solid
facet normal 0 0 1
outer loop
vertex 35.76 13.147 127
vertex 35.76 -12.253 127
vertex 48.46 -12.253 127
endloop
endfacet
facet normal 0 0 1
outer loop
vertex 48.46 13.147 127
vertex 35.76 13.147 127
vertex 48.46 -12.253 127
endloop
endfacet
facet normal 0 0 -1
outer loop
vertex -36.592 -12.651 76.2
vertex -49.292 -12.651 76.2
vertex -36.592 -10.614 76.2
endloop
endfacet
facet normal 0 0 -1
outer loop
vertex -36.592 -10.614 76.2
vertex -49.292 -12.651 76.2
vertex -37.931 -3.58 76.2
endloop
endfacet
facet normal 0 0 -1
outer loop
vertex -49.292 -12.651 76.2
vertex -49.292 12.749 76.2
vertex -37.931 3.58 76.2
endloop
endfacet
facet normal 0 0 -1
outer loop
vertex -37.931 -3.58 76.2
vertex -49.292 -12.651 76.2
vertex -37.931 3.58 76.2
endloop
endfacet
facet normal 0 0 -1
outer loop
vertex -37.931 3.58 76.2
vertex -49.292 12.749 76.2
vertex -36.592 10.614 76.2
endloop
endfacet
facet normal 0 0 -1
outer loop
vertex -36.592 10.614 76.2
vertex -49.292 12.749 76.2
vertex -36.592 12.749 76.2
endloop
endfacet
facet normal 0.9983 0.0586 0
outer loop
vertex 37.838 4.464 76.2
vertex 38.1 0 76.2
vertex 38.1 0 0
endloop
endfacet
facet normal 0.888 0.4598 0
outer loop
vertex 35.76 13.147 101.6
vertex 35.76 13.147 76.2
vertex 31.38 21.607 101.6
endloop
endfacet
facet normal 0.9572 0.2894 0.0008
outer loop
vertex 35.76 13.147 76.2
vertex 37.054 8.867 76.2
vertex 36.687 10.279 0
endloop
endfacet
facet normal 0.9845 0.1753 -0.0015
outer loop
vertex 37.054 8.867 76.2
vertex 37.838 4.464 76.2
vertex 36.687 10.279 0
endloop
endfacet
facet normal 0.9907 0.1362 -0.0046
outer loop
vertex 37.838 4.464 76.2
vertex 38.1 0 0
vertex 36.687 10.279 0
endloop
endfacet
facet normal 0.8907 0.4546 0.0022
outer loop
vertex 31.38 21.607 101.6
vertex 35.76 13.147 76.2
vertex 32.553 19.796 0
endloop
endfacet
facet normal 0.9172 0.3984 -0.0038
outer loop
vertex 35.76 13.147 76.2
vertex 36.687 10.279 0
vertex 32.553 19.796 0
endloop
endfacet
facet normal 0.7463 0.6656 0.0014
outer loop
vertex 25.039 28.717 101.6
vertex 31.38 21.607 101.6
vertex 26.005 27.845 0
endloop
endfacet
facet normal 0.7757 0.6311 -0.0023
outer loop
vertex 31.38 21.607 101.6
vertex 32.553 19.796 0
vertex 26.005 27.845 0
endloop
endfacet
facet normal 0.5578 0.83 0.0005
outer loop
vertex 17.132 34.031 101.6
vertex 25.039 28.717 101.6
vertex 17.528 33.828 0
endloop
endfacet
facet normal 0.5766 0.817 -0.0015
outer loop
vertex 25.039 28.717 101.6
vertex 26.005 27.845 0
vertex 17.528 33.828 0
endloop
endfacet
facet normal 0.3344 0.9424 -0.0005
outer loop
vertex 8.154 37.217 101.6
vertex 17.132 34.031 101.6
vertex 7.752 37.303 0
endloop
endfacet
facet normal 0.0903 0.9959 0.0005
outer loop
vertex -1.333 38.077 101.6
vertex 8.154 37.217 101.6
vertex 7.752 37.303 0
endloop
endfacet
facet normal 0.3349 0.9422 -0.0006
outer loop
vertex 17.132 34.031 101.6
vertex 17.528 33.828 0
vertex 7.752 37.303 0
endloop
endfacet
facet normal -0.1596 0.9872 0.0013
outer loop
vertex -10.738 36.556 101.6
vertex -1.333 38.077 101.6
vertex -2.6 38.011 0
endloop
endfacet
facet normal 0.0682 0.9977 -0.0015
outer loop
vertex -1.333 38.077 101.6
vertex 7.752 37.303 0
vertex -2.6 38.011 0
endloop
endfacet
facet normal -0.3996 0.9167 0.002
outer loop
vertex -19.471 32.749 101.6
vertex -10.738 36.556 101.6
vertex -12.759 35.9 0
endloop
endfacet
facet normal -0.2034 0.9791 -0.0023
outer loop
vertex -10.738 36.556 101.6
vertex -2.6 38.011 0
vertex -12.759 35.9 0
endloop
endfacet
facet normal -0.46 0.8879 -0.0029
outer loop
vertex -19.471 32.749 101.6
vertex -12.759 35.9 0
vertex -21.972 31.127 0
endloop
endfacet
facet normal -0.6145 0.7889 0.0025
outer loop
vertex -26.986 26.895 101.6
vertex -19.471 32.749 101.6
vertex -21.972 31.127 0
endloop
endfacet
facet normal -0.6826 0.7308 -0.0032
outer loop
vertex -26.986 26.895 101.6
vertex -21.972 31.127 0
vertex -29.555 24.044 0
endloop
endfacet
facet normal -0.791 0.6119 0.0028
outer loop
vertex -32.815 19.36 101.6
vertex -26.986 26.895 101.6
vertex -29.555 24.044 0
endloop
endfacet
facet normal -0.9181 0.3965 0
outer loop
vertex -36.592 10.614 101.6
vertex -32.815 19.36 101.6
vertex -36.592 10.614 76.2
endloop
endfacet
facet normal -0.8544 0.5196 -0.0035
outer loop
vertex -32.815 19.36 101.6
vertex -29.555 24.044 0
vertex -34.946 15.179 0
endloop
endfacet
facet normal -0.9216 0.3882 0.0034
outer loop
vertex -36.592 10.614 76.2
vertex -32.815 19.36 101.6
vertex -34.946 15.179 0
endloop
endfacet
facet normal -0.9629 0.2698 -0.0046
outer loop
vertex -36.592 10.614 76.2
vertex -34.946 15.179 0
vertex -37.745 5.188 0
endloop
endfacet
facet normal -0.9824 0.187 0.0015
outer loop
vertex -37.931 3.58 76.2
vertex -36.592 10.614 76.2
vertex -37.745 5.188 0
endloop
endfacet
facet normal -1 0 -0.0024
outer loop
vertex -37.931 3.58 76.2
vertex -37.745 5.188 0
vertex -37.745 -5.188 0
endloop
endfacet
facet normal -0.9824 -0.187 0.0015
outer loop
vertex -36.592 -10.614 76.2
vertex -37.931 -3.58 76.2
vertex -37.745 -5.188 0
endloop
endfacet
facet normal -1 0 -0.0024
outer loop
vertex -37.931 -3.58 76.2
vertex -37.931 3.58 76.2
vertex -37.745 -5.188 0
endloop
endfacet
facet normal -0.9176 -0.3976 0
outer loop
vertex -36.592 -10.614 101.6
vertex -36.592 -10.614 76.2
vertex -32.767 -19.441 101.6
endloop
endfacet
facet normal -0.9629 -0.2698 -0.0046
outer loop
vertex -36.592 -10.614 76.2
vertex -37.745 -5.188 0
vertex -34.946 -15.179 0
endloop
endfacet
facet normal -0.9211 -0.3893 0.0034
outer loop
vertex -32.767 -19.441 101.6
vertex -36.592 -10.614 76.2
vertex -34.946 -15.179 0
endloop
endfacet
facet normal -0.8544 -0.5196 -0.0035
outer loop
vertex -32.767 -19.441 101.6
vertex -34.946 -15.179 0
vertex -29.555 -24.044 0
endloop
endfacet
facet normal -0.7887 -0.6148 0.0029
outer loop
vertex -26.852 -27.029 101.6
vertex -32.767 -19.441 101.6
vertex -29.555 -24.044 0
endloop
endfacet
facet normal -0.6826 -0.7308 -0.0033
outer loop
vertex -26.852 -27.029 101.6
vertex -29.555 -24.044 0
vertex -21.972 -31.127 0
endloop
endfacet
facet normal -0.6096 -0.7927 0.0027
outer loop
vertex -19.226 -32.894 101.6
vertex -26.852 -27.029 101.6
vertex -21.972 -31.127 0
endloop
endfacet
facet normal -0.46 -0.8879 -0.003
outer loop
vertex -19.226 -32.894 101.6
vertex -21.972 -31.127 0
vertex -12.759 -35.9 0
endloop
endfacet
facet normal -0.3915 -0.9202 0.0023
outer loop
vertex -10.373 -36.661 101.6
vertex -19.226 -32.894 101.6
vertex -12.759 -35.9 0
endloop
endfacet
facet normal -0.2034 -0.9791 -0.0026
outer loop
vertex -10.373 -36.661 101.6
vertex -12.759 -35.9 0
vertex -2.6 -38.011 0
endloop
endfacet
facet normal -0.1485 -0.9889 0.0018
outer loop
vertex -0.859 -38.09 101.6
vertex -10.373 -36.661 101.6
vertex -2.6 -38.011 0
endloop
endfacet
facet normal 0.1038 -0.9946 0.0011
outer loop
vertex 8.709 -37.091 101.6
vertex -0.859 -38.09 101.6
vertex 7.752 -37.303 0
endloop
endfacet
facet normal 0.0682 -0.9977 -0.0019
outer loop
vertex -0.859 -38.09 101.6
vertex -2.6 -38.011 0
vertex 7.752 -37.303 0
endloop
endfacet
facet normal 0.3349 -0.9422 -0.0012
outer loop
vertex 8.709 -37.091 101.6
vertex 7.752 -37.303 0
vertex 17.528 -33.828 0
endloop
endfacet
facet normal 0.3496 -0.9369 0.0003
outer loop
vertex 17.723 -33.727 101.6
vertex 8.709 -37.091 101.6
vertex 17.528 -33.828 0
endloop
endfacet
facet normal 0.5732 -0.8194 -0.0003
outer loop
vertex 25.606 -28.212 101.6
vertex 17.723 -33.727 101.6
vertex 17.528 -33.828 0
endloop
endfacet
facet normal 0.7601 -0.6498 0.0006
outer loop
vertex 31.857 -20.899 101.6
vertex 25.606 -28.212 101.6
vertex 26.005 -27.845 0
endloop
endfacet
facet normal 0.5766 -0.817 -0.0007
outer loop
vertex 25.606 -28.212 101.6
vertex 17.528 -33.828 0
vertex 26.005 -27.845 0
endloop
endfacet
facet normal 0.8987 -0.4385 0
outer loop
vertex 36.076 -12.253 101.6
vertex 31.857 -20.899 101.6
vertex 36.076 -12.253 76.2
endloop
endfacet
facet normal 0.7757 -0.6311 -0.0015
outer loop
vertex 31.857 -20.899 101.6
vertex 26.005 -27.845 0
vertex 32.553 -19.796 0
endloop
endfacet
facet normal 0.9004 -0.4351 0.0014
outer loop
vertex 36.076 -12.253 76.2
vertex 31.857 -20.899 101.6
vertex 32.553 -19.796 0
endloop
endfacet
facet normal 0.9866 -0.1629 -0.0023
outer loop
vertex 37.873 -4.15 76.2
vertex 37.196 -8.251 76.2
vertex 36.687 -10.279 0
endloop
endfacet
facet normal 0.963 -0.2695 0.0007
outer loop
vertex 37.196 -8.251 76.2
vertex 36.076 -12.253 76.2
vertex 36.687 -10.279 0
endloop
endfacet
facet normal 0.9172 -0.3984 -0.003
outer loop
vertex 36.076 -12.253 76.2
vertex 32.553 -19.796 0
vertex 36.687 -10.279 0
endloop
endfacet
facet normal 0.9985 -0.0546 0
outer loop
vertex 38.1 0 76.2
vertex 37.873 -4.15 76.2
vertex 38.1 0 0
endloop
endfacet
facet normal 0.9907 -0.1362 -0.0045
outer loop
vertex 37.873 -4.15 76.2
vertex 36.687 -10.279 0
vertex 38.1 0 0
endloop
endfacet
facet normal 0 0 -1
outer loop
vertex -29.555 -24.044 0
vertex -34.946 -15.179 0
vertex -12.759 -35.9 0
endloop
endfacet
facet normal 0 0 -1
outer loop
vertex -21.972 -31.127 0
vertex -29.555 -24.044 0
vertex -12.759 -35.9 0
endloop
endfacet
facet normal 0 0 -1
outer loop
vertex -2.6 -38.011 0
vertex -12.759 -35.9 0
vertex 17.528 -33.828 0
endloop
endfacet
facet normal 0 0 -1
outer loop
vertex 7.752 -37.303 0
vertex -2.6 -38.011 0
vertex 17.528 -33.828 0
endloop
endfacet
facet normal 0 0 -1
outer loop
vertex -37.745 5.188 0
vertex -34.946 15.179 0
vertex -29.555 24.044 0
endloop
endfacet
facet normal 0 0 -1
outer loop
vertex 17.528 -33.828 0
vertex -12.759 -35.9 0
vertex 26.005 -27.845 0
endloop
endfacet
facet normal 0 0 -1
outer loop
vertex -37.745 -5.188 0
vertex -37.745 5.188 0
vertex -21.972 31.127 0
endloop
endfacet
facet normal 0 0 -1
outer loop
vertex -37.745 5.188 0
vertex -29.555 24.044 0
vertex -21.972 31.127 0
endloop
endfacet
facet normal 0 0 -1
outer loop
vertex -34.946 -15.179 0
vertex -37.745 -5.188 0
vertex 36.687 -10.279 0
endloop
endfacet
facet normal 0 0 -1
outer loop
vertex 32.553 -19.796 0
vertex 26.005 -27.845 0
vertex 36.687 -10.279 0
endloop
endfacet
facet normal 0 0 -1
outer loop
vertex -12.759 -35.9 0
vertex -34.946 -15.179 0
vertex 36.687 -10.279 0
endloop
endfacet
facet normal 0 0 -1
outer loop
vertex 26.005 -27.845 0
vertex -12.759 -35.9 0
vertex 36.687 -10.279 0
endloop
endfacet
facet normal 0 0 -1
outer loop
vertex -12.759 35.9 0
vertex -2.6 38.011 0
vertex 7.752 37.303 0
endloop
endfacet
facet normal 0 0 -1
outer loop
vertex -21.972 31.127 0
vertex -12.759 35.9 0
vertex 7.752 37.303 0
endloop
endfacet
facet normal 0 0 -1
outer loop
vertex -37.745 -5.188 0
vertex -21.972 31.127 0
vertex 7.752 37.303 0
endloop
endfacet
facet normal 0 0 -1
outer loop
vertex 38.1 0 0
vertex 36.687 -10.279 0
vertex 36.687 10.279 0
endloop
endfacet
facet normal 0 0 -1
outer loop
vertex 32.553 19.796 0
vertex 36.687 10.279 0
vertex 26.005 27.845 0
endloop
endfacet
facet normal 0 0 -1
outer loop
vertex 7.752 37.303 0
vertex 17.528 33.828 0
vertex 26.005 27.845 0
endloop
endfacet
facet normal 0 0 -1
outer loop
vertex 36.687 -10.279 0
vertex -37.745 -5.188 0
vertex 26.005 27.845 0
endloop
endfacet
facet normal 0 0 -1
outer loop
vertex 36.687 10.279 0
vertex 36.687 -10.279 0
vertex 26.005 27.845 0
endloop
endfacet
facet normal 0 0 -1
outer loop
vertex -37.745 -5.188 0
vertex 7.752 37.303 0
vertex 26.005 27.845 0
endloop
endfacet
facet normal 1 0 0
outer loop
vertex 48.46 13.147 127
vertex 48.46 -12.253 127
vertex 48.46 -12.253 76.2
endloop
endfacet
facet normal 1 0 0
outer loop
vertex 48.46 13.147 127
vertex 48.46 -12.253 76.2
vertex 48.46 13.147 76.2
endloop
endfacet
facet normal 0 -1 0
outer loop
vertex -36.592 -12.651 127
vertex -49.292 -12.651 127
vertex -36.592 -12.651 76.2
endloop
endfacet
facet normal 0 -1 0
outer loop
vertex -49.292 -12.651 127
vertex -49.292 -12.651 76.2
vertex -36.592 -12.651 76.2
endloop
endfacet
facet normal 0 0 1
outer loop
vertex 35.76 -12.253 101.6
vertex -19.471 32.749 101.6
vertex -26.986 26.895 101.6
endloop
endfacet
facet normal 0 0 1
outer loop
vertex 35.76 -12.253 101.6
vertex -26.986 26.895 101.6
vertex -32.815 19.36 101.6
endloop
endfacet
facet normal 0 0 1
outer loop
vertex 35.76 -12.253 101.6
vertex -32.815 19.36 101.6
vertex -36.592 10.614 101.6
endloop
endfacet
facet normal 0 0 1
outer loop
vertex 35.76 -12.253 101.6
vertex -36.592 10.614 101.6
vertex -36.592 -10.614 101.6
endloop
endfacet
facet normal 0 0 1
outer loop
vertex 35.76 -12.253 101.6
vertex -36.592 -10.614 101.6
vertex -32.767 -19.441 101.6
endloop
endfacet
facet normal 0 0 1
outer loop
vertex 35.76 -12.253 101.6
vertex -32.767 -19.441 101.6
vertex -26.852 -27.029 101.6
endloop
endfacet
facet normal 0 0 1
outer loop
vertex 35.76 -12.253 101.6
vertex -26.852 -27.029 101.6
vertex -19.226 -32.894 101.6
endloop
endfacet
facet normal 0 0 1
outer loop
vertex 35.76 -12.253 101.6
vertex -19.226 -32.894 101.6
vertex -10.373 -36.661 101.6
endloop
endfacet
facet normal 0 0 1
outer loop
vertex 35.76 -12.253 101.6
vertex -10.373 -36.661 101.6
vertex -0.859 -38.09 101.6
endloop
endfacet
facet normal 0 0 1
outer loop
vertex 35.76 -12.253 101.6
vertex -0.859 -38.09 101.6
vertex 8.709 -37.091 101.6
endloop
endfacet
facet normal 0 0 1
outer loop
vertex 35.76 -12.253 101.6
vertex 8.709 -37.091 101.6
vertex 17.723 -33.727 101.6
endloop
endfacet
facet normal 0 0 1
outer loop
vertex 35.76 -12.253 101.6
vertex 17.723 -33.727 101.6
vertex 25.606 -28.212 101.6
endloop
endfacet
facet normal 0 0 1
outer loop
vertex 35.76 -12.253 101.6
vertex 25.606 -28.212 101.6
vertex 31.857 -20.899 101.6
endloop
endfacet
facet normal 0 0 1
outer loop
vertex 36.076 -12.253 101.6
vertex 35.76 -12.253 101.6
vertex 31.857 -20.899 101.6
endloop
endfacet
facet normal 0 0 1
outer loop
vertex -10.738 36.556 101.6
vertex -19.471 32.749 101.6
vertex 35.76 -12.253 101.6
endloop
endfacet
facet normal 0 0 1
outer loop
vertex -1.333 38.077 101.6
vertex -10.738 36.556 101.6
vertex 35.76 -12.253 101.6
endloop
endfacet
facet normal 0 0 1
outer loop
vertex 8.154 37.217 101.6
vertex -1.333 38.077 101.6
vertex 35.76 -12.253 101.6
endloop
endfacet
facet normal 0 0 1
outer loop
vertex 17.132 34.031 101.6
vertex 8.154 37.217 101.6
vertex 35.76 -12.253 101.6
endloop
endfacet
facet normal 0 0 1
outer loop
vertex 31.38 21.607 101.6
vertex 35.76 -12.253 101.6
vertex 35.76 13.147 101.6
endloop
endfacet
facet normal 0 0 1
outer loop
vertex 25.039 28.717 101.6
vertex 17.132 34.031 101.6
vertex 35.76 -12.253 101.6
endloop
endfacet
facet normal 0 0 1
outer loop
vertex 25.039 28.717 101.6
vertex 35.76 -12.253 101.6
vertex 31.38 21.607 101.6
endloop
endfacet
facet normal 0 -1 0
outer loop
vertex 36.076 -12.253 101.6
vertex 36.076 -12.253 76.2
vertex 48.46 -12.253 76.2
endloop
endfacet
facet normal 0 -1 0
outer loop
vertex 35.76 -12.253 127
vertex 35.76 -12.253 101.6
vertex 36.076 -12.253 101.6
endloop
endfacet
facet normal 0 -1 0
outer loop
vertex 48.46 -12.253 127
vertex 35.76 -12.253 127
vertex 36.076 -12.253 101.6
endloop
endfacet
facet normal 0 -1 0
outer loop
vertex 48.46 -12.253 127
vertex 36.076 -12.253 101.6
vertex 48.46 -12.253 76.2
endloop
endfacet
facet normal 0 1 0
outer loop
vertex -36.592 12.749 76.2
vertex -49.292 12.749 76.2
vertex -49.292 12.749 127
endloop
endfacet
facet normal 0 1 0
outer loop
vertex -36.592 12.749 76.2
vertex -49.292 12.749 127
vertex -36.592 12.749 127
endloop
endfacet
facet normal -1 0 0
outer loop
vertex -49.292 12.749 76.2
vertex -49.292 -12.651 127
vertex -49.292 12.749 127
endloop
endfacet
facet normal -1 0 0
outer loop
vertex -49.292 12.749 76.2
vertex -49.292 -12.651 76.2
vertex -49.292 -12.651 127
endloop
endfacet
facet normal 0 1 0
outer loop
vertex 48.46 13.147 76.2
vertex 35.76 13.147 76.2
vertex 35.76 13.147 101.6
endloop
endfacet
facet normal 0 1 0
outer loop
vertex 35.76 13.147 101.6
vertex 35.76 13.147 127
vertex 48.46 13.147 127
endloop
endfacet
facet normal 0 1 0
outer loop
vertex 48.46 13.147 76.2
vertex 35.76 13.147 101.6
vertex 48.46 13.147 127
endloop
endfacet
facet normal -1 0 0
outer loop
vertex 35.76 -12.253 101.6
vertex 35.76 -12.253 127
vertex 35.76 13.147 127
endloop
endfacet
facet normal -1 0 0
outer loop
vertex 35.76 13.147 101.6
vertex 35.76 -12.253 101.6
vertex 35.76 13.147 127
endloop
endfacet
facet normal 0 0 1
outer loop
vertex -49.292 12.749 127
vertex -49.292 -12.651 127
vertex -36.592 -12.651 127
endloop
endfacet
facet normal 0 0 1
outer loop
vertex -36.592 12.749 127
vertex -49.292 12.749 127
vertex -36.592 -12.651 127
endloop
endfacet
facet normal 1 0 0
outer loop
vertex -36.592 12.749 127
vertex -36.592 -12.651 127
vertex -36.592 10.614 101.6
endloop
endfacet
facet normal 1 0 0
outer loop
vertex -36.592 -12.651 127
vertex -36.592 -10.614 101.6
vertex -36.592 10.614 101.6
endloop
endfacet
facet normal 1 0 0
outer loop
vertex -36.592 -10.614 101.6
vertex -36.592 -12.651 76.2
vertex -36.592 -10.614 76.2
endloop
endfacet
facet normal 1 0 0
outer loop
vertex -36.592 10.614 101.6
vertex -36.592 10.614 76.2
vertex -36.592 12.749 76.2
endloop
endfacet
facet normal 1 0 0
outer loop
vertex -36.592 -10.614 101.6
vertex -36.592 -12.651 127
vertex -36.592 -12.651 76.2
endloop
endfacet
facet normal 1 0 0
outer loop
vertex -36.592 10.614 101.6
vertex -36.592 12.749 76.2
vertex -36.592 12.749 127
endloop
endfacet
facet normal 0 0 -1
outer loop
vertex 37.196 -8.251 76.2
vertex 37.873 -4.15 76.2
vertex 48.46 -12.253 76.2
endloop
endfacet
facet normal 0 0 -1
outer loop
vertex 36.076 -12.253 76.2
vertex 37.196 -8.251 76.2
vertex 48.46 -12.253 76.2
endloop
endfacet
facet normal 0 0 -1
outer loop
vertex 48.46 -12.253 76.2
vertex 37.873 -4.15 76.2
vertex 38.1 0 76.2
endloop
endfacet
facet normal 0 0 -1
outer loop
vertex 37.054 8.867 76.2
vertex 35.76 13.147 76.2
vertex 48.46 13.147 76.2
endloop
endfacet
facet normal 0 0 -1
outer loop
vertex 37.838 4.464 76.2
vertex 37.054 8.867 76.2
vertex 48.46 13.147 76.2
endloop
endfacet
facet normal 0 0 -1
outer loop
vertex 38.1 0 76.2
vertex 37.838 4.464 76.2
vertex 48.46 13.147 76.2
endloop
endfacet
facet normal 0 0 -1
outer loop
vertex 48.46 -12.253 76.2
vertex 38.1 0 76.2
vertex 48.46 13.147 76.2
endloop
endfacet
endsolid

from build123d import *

# Parameters (mm, degrees)
F0_R     = 38.1
F1_DEPTH = 101.6
F2_W     = 12.7
F2_H     = 25.4
F3_DEPTH = 25.4


# Not quite as in the source:
# - a feature of the source that left no trace in its solid (it failed there, or was rolled back) is left out


with BuildPart() as f1:
    # F0 (on Top) → F1 (new body)
    with BuildSketch(Plane.XY):
        Circle(F0_R)
    extrude(amount=F1_DEPTH)

    # F2 (on face) → F3 (join, symmetric)
    with BuildSketch(Plane.XY.offset(101.6)):
        with Locations((-42.9418016334, 0.0489659142)):
            Rectangle(F2_W, F2_H)
        with Locations((42.1098351814, 0.4470220127)):
            Rectangle(F2_W, F2_H)
    extrude(amount=F3_DEPTH, both=True)


solid = f1.part
